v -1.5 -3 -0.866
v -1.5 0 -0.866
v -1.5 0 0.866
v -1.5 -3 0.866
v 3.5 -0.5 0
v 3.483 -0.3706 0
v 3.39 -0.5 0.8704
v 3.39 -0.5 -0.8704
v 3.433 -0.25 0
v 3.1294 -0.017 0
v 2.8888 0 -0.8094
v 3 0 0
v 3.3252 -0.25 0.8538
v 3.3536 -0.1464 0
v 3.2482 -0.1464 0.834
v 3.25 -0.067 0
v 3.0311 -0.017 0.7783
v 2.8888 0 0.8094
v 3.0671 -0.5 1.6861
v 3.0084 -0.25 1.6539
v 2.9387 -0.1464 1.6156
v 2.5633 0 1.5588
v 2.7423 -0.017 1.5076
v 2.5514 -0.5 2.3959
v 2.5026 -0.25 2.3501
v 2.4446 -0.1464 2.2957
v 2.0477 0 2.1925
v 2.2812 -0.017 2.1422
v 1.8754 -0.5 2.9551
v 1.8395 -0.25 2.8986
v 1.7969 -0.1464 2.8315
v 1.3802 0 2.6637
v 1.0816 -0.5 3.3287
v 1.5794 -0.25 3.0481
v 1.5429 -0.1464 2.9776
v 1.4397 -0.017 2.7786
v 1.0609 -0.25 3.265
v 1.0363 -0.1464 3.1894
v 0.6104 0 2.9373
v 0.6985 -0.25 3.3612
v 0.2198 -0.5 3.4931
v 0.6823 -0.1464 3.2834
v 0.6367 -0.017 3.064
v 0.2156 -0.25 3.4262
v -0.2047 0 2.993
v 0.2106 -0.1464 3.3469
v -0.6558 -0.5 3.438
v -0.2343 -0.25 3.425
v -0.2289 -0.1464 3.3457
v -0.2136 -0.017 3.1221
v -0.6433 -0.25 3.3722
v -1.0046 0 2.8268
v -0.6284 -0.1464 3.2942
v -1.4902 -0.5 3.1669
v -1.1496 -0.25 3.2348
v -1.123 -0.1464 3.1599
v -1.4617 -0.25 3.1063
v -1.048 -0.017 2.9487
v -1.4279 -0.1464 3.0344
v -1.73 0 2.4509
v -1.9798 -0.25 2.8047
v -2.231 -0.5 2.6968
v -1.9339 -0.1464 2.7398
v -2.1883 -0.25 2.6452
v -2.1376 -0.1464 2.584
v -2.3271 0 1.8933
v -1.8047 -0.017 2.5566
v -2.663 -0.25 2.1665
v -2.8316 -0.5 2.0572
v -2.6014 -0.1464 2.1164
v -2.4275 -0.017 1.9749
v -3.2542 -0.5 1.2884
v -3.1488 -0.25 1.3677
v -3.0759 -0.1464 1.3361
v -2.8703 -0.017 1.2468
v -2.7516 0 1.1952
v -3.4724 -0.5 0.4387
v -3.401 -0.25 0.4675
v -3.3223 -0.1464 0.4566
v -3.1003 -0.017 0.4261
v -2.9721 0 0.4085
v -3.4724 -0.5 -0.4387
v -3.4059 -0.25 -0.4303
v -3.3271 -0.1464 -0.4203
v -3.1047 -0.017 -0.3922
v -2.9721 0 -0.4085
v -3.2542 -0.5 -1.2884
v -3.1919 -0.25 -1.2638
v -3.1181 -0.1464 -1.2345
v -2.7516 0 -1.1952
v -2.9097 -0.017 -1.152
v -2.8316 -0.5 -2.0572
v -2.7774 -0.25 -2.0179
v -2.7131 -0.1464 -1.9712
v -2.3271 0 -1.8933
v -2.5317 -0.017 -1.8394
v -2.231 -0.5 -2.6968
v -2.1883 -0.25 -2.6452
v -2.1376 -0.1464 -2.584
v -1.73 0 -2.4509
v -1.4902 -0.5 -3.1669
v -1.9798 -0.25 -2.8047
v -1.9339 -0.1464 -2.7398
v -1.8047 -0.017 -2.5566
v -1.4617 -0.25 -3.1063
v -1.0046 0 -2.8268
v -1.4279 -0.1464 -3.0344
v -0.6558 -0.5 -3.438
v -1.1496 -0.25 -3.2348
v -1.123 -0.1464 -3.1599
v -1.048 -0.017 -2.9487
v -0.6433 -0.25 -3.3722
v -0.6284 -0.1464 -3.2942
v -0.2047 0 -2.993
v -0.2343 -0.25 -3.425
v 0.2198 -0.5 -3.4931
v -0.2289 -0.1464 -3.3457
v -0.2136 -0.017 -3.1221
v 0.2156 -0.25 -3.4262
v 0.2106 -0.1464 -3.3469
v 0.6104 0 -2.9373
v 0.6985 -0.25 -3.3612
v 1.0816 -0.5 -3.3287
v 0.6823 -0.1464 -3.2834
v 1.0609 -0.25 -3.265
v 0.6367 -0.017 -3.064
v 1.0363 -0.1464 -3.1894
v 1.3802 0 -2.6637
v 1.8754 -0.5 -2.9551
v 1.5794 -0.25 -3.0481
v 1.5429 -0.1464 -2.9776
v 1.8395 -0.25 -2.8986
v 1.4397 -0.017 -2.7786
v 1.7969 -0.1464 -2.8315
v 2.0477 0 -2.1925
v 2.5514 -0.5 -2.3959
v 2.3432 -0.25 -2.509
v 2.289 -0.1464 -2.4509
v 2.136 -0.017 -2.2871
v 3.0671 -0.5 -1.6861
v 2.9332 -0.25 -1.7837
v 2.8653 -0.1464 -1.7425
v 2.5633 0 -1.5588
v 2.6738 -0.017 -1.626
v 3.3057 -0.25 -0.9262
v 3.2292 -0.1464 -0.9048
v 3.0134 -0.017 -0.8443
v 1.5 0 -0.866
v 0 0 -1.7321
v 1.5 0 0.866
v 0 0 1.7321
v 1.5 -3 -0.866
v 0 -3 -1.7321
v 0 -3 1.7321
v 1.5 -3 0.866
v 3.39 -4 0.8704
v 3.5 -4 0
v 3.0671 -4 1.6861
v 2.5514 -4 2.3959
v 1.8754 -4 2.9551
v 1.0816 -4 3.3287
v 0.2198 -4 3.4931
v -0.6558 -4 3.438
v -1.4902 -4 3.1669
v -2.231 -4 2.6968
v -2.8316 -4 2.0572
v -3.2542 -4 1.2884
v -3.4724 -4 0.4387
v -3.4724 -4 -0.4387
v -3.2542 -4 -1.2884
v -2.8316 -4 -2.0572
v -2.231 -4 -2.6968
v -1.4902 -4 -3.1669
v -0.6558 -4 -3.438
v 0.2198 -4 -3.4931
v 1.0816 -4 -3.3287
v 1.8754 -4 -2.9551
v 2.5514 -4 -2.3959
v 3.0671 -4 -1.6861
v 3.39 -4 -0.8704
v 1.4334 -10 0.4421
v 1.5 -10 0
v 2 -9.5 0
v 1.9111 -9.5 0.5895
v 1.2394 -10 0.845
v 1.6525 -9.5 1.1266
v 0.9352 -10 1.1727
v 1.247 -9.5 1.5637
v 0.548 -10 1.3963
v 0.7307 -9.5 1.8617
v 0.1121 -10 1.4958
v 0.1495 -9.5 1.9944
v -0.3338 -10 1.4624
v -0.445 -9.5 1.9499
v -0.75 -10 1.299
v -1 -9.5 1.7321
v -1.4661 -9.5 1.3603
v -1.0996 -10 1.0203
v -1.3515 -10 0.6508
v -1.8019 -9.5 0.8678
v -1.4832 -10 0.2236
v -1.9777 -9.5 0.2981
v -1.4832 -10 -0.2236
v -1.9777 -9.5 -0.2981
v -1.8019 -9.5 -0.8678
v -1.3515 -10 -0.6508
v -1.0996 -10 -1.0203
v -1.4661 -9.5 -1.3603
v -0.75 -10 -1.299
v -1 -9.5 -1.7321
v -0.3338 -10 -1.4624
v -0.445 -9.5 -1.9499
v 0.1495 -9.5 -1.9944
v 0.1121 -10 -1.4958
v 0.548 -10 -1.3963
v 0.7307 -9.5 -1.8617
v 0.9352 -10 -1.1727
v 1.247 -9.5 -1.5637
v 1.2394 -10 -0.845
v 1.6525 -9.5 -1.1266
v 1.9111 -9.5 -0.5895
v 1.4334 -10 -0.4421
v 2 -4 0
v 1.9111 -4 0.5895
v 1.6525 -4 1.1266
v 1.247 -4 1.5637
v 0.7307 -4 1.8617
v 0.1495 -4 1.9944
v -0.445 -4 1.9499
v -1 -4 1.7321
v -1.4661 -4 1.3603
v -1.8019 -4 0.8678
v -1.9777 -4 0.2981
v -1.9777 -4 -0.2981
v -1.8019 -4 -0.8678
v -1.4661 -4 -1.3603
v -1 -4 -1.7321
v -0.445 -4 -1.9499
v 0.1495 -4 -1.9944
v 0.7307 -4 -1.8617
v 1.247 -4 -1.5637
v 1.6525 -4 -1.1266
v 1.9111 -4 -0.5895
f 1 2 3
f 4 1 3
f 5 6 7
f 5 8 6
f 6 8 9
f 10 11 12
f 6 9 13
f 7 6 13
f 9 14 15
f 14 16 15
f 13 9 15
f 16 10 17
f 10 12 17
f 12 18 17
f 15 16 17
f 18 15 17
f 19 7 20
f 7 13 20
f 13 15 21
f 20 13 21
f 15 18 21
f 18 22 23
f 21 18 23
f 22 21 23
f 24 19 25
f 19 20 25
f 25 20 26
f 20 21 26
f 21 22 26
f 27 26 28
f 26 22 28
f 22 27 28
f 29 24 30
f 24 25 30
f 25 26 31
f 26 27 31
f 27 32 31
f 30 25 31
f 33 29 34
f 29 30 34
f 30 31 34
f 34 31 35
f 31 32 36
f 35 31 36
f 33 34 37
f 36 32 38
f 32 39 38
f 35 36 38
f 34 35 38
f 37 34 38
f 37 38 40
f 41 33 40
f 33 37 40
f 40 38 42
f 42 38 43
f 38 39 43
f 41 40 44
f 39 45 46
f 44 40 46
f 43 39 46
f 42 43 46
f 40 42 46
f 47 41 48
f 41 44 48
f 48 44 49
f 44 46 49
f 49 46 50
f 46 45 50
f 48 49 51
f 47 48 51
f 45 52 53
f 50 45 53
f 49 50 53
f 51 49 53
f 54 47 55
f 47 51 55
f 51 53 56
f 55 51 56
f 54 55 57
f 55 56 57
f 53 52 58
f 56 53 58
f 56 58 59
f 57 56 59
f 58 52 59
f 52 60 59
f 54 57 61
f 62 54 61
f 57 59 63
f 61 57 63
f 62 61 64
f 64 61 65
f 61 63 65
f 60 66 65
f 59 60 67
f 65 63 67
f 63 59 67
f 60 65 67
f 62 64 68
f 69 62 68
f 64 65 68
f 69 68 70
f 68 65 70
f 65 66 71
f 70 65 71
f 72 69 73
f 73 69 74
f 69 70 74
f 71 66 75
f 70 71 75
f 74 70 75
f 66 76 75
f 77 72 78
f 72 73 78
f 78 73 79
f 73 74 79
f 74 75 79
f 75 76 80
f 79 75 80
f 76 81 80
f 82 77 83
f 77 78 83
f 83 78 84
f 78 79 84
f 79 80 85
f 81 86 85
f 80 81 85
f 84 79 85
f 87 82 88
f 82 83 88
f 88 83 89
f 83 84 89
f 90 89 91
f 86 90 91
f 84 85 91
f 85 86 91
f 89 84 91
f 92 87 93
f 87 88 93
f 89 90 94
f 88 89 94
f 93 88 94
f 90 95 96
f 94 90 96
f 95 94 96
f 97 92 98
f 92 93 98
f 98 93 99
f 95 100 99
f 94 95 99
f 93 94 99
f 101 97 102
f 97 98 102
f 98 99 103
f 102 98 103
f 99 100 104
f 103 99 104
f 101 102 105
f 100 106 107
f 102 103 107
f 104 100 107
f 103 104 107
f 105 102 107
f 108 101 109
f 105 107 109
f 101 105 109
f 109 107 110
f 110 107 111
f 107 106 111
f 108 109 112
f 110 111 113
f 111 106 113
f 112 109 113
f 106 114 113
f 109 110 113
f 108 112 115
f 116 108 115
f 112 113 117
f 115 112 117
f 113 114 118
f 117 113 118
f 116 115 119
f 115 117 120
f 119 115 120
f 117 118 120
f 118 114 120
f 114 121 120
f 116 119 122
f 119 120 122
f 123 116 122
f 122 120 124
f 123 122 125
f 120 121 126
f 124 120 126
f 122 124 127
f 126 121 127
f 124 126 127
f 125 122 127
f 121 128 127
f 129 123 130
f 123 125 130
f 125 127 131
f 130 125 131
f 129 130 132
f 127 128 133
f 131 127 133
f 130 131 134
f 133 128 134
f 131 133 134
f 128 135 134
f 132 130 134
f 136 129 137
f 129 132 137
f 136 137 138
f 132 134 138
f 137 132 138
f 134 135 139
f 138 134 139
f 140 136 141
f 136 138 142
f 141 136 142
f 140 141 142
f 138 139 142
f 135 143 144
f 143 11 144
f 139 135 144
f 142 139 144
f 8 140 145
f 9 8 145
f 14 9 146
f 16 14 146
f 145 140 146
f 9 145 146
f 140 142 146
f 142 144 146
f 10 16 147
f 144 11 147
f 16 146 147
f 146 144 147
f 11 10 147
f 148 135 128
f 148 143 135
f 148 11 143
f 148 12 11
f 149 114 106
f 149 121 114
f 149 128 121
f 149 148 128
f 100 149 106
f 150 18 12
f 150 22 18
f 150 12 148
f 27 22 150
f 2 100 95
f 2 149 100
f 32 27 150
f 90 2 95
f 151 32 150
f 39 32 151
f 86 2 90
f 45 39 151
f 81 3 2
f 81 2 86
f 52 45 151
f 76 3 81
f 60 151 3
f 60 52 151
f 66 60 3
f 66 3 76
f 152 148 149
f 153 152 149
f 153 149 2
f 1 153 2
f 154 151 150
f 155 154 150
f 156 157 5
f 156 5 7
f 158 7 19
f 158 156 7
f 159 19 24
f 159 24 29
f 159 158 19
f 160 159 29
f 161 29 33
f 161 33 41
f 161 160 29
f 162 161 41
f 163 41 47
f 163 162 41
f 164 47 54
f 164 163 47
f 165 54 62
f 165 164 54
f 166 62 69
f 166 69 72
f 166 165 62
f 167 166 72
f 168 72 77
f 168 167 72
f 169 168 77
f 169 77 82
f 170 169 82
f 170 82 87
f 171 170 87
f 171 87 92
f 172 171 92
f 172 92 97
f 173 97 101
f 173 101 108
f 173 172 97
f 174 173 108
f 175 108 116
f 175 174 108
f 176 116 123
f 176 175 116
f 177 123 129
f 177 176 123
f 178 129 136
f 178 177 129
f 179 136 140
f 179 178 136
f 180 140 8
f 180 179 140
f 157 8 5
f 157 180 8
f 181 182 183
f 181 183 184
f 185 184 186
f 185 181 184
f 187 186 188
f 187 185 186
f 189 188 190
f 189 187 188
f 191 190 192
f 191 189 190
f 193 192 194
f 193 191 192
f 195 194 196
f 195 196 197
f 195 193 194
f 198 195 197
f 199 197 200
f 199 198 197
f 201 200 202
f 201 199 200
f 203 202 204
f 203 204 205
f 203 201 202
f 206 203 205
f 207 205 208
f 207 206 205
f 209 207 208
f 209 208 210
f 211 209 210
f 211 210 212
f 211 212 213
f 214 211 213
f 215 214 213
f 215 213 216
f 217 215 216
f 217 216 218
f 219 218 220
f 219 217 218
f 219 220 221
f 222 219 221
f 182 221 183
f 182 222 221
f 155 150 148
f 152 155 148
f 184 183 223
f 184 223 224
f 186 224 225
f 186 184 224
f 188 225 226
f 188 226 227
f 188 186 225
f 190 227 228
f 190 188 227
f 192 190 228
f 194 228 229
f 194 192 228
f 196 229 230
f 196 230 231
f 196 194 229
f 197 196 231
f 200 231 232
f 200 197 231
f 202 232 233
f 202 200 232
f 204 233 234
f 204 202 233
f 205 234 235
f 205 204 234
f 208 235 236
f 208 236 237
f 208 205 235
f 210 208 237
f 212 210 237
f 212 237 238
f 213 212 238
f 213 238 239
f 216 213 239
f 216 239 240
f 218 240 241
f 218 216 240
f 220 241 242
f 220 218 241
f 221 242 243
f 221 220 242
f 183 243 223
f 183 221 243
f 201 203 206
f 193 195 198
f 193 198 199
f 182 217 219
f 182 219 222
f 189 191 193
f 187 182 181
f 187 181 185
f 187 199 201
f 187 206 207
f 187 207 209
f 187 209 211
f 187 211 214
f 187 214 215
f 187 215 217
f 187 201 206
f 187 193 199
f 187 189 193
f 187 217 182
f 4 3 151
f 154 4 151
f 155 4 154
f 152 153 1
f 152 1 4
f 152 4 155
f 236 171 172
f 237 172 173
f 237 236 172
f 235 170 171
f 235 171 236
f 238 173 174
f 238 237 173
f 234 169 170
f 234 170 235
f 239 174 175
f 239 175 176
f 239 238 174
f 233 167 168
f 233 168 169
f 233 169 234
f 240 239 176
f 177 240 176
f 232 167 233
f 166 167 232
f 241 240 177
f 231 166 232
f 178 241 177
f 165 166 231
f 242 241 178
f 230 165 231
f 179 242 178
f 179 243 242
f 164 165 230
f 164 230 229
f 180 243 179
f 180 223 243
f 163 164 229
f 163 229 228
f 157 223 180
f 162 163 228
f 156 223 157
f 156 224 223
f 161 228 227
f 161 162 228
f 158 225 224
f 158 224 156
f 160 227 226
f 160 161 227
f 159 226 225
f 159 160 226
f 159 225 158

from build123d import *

# Parameters (mm, degrees)
CORTAR_EXTRUIR1_DEPTH = 3
CHAFL_N1_SIZE         = 0.5
REDONDEO1_R           = 0.5


with BuildPart() as part:
    # Croquis1 → Revolución1 (revolve)
    with BuildSketch(Plane.XY):
        Polygon((0, 0), (3.5, 0), (3.5, -4), (2, -4), (2, -10), (0, -10), align=None)
    revolve(axis=Axis((0, 0, 0), (0, -1, 0)))

    # Croquis2 → Cortar-Extruir1 (cut)
    with BuildSketch(Plane(origin=(0, 0, 0), x_dir=(1, 0, 0), z_dir=(0, 1, 0))):
        Polygon((1.5, 0.866025404), (0, 1.732050808), (-1.5, 0.866025404), (-1.5, -0.866025404), (0, -1.732050808), (1.5, -0.866025404), align=None)
    extrude(amount=-CORTAR_EXTRUIR1_DEPTH, mode=Mode.SUBTRACT)

    # Chaflán1
    chafl_n1_edges = [part.edges().sort_by_distance(p)[0] for p in [
        (-2, -10, 0),
    ]]
    chamfer(chafl_n1_edges, length=CHAFL_N1_SIZE)

    # Redondeo1
    redondeo1_edges = [part.edges().sort_by_distance(p)[0] for p in [
        (-3.5, 0, 0),
    ]]
    fillet(redondeo1_edges, radius=REDONDEO1_R)


solid = part.part
